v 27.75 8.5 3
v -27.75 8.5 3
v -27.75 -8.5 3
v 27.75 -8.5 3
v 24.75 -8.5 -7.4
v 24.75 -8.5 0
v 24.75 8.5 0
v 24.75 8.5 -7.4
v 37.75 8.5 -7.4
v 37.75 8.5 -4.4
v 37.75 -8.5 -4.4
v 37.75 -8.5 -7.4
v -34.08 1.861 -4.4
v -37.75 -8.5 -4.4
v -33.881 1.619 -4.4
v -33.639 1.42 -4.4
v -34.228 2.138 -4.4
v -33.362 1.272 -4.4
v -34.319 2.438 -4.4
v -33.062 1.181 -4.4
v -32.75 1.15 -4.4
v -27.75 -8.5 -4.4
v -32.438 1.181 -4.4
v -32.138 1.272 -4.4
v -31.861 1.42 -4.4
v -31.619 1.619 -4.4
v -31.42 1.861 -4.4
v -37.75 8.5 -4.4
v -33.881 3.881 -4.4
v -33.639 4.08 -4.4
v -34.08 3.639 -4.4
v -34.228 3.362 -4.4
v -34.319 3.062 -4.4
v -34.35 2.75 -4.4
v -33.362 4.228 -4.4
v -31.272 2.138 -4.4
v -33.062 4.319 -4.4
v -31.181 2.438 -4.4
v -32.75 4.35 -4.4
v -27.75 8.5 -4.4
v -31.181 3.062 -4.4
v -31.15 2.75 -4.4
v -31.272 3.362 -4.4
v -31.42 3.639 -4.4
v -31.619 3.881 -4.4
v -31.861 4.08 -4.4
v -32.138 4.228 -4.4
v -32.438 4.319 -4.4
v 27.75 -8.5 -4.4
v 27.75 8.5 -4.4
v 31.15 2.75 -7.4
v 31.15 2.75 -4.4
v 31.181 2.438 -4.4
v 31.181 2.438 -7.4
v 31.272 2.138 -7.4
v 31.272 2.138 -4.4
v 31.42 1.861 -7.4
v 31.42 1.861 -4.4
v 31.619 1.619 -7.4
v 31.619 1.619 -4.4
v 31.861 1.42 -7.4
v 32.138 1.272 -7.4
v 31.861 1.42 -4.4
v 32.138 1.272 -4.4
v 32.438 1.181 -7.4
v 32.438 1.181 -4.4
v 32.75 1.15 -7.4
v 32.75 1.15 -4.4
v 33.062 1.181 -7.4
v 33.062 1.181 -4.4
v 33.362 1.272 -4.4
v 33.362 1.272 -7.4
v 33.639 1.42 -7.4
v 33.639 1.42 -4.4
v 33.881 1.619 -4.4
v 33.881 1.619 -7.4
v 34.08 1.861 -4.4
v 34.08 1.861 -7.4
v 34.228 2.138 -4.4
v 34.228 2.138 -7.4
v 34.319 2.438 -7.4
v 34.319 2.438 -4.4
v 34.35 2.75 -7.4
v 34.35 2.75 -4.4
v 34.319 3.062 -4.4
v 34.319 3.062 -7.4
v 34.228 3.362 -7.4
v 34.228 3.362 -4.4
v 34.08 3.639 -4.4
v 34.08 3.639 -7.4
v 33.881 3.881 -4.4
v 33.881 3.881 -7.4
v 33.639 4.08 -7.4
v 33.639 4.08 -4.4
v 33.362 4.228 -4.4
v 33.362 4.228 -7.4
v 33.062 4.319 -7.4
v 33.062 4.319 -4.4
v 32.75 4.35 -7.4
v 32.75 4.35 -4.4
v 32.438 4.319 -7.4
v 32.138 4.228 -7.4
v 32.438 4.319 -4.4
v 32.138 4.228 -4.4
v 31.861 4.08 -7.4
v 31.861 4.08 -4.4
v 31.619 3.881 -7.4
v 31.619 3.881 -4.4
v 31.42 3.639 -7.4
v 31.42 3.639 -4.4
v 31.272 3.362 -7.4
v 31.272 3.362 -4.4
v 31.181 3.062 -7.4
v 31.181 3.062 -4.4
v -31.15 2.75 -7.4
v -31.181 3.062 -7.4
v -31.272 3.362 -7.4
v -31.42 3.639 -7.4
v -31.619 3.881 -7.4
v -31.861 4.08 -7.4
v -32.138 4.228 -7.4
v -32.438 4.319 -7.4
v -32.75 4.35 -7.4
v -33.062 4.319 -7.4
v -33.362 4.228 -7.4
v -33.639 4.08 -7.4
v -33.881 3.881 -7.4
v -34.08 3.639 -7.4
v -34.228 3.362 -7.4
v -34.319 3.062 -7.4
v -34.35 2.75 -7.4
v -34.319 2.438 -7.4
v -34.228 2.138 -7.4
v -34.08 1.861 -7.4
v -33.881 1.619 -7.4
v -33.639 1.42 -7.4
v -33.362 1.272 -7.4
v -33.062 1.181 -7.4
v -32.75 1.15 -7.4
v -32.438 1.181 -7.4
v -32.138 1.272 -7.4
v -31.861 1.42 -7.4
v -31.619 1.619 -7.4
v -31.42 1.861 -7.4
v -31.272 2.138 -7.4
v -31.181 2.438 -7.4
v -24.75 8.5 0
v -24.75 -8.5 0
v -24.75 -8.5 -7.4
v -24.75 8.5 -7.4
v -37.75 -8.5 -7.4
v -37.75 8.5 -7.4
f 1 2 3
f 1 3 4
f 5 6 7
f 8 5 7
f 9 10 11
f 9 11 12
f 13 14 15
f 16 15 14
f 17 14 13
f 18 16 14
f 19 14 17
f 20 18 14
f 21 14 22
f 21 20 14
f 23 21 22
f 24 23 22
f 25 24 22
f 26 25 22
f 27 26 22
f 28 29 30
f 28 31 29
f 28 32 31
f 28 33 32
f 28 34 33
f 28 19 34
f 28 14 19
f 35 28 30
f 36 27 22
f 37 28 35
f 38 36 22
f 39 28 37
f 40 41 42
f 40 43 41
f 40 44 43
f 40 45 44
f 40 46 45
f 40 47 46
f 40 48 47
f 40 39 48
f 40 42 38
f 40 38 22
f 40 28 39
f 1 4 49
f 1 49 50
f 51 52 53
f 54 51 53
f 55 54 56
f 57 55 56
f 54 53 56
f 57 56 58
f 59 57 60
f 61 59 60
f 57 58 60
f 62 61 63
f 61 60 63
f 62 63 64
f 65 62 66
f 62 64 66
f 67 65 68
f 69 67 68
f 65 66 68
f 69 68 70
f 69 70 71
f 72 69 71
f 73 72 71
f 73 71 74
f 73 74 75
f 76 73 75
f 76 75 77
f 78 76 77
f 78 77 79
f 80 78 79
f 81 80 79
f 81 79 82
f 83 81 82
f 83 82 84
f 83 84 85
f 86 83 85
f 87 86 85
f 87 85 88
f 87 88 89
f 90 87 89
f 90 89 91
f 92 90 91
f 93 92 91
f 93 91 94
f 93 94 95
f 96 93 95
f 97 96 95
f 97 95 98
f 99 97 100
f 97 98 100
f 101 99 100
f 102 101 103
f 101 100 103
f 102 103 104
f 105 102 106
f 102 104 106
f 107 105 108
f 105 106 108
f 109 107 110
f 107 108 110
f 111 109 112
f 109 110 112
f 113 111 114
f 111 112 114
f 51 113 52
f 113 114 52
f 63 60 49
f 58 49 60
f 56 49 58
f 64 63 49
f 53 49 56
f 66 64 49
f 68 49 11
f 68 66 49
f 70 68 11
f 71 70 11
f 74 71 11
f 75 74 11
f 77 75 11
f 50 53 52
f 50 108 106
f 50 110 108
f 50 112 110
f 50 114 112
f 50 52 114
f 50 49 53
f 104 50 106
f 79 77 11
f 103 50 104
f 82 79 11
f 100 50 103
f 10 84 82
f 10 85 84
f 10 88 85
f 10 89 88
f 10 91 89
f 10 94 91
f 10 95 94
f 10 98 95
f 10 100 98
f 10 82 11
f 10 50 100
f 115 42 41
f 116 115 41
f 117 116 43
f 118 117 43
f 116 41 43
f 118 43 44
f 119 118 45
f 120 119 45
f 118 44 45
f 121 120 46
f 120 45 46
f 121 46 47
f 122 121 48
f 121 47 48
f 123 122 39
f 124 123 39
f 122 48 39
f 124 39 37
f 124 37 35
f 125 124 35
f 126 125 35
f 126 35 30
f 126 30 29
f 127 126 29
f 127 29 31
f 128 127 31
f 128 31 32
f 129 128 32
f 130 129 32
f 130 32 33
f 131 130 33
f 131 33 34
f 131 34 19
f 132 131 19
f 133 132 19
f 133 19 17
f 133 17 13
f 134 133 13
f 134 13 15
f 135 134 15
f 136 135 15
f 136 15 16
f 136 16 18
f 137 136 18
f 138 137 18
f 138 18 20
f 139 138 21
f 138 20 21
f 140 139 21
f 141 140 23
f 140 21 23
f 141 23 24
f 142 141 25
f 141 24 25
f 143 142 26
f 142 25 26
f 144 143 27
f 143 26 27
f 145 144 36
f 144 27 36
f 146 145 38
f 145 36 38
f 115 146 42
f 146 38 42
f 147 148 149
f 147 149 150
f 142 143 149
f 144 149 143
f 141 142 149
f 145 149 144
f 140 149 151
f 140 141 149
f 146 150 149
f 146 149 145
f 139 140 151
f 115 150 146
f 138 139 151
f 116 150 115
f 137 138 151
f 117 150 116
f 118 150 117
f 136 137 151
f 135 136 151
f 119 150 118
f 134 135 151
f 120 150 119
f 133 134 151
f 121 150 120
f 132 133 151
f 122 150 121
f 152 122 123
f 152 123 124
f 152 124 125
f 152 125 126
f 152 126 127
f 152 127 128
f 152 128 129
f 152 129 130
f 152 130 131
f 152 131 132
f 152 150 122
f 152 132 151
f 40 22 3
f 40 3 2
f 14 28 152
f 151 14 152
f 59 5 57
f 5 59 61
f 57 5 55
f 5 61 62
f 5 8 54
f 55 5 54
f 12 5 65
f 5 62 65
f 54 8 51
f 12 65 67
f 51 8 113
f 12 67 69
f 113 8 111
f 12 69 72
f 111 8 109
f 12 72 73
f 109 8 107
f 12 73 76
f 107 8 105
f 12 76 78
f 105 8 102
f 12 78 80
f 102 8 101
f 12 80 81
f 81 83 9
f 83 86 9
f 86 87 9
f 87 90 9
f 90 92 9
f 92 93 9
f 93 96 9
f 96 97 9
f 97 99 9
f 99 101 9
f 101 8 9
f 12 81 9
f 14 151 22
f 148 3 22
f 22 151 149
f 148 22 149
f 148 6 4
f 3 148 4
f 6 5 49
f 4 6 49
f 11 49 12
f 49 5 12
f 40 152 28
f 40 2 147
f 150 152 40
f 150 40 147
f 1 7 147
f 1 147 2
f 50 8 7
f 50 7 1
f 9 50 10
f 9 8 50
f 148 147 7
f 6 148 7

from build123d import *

# Parameters (mm, degrees)
ESBO_O1_W                = 55.5
ESBO_O1_H                = 17
RESSALTO_EXTRUS_O1_DEPTH = 3
ESBO_O9_W                = 3
ESBO_O9_H                = 17
RESSALTO_EXTRUS_O5_DEPTH = 7.4
ESBO_O10_W               = 10
ESBO_O10_H               = 3
RESSALTO_EXTRUS_O6_DEPTH = 17
CORTE_EXTRUS_O4_REACH    = 41.396
ESBO_O11_R               = 1.6


with BuildPart() as part:
    # Esboço1 → Ressalto-extrusão1 (new body)
    with BuildSketch(Plane.XY):
        Rectangle(ESBO_O1_W, ESBO_O1_H)
    extrude(amount=RESSALTO_EXTRUS_O1_DEPTH)

    # Esboço9 → Ressalto-extrusão5 (add)
    with BuildSketch(Plane(origin=(0, 0, 0), x_dir=(-1, 0, 0), z_dir=(0, 0, -1))):
        with Locations((-26.25, 0)):
            Rectangle(ESBO_O9_W, ESBO_O9_H)
        with Locations((26.25, 0)):
            Rectangle(ESBO_O9_W, ESBO_O9_H)
    extrude(amount=RESSALTO_EXTRUS_O5_DEPTH)

    # Esboço10 → Ressalto-extrusão6 (add, through all)
    with BuildSketch(Plane(origin=(0, 8.5, 0), x_dir=(1, 0, 0), z_dir=(0, 1, 0))):
        with Locations((32.75, 5.9)):
            Rectangle(ESBO_O10_W, ESBO_O10_H)
        with Locations((-32.75, 5.9)):
            Rectangle(ESBO_O10_W, ESBO_O10_H)
    extrude(amount=-RESSALTO_EXTRUS_O6_DEPTH)

    # Esboço11 → Corte-extrusão4 (cut, up to next)
    with BuildSketch(Plane.XY.offset(-4.4), mode=Mode.PRIVATE) as corte_extrus_o4_sk1:
        with Locations((-32.75, 2.75)):
            Circle(ESBO_O11_R)
    corte_extrus_o4_tool1 = extrude(corte_extrus_o4_sk1.sketch, amount=-CORTE_EXTRUS_O4_REACH, mode=Mode.PRIVATE) & part.part
    # Esboço11 → Corte-extrusão4 (cut, up to next)
    with BuildSketch(Plane.XY.offset(-4.4), mode=Mode.PRIVATE) as corte_extrus_o4_sk2:
        with Locations(Location((32.75, 2.75, 0), (0, 0, 180))):
            Circle(ESBO_O11_R)
    corte_extrus_o4_tool2 = extrude(corte_extrus_o4_sk2.sketch, amount=-CORTE_EXTRUS_O4_REACH, mode=Mode.PRIVATE) & part.part
    add(corte_extrus_o4_tool1.solids().sort_by_distance((-32.75, 2.75, -4.4))[0], mode=Mode.SUBTRACT)
    add(corte_extrus_o4_tool2.solids().sort_by_distance((32.75, 2.75, -4.4))[0], mode=Mode.SUBTRACT)


solid = part.part
